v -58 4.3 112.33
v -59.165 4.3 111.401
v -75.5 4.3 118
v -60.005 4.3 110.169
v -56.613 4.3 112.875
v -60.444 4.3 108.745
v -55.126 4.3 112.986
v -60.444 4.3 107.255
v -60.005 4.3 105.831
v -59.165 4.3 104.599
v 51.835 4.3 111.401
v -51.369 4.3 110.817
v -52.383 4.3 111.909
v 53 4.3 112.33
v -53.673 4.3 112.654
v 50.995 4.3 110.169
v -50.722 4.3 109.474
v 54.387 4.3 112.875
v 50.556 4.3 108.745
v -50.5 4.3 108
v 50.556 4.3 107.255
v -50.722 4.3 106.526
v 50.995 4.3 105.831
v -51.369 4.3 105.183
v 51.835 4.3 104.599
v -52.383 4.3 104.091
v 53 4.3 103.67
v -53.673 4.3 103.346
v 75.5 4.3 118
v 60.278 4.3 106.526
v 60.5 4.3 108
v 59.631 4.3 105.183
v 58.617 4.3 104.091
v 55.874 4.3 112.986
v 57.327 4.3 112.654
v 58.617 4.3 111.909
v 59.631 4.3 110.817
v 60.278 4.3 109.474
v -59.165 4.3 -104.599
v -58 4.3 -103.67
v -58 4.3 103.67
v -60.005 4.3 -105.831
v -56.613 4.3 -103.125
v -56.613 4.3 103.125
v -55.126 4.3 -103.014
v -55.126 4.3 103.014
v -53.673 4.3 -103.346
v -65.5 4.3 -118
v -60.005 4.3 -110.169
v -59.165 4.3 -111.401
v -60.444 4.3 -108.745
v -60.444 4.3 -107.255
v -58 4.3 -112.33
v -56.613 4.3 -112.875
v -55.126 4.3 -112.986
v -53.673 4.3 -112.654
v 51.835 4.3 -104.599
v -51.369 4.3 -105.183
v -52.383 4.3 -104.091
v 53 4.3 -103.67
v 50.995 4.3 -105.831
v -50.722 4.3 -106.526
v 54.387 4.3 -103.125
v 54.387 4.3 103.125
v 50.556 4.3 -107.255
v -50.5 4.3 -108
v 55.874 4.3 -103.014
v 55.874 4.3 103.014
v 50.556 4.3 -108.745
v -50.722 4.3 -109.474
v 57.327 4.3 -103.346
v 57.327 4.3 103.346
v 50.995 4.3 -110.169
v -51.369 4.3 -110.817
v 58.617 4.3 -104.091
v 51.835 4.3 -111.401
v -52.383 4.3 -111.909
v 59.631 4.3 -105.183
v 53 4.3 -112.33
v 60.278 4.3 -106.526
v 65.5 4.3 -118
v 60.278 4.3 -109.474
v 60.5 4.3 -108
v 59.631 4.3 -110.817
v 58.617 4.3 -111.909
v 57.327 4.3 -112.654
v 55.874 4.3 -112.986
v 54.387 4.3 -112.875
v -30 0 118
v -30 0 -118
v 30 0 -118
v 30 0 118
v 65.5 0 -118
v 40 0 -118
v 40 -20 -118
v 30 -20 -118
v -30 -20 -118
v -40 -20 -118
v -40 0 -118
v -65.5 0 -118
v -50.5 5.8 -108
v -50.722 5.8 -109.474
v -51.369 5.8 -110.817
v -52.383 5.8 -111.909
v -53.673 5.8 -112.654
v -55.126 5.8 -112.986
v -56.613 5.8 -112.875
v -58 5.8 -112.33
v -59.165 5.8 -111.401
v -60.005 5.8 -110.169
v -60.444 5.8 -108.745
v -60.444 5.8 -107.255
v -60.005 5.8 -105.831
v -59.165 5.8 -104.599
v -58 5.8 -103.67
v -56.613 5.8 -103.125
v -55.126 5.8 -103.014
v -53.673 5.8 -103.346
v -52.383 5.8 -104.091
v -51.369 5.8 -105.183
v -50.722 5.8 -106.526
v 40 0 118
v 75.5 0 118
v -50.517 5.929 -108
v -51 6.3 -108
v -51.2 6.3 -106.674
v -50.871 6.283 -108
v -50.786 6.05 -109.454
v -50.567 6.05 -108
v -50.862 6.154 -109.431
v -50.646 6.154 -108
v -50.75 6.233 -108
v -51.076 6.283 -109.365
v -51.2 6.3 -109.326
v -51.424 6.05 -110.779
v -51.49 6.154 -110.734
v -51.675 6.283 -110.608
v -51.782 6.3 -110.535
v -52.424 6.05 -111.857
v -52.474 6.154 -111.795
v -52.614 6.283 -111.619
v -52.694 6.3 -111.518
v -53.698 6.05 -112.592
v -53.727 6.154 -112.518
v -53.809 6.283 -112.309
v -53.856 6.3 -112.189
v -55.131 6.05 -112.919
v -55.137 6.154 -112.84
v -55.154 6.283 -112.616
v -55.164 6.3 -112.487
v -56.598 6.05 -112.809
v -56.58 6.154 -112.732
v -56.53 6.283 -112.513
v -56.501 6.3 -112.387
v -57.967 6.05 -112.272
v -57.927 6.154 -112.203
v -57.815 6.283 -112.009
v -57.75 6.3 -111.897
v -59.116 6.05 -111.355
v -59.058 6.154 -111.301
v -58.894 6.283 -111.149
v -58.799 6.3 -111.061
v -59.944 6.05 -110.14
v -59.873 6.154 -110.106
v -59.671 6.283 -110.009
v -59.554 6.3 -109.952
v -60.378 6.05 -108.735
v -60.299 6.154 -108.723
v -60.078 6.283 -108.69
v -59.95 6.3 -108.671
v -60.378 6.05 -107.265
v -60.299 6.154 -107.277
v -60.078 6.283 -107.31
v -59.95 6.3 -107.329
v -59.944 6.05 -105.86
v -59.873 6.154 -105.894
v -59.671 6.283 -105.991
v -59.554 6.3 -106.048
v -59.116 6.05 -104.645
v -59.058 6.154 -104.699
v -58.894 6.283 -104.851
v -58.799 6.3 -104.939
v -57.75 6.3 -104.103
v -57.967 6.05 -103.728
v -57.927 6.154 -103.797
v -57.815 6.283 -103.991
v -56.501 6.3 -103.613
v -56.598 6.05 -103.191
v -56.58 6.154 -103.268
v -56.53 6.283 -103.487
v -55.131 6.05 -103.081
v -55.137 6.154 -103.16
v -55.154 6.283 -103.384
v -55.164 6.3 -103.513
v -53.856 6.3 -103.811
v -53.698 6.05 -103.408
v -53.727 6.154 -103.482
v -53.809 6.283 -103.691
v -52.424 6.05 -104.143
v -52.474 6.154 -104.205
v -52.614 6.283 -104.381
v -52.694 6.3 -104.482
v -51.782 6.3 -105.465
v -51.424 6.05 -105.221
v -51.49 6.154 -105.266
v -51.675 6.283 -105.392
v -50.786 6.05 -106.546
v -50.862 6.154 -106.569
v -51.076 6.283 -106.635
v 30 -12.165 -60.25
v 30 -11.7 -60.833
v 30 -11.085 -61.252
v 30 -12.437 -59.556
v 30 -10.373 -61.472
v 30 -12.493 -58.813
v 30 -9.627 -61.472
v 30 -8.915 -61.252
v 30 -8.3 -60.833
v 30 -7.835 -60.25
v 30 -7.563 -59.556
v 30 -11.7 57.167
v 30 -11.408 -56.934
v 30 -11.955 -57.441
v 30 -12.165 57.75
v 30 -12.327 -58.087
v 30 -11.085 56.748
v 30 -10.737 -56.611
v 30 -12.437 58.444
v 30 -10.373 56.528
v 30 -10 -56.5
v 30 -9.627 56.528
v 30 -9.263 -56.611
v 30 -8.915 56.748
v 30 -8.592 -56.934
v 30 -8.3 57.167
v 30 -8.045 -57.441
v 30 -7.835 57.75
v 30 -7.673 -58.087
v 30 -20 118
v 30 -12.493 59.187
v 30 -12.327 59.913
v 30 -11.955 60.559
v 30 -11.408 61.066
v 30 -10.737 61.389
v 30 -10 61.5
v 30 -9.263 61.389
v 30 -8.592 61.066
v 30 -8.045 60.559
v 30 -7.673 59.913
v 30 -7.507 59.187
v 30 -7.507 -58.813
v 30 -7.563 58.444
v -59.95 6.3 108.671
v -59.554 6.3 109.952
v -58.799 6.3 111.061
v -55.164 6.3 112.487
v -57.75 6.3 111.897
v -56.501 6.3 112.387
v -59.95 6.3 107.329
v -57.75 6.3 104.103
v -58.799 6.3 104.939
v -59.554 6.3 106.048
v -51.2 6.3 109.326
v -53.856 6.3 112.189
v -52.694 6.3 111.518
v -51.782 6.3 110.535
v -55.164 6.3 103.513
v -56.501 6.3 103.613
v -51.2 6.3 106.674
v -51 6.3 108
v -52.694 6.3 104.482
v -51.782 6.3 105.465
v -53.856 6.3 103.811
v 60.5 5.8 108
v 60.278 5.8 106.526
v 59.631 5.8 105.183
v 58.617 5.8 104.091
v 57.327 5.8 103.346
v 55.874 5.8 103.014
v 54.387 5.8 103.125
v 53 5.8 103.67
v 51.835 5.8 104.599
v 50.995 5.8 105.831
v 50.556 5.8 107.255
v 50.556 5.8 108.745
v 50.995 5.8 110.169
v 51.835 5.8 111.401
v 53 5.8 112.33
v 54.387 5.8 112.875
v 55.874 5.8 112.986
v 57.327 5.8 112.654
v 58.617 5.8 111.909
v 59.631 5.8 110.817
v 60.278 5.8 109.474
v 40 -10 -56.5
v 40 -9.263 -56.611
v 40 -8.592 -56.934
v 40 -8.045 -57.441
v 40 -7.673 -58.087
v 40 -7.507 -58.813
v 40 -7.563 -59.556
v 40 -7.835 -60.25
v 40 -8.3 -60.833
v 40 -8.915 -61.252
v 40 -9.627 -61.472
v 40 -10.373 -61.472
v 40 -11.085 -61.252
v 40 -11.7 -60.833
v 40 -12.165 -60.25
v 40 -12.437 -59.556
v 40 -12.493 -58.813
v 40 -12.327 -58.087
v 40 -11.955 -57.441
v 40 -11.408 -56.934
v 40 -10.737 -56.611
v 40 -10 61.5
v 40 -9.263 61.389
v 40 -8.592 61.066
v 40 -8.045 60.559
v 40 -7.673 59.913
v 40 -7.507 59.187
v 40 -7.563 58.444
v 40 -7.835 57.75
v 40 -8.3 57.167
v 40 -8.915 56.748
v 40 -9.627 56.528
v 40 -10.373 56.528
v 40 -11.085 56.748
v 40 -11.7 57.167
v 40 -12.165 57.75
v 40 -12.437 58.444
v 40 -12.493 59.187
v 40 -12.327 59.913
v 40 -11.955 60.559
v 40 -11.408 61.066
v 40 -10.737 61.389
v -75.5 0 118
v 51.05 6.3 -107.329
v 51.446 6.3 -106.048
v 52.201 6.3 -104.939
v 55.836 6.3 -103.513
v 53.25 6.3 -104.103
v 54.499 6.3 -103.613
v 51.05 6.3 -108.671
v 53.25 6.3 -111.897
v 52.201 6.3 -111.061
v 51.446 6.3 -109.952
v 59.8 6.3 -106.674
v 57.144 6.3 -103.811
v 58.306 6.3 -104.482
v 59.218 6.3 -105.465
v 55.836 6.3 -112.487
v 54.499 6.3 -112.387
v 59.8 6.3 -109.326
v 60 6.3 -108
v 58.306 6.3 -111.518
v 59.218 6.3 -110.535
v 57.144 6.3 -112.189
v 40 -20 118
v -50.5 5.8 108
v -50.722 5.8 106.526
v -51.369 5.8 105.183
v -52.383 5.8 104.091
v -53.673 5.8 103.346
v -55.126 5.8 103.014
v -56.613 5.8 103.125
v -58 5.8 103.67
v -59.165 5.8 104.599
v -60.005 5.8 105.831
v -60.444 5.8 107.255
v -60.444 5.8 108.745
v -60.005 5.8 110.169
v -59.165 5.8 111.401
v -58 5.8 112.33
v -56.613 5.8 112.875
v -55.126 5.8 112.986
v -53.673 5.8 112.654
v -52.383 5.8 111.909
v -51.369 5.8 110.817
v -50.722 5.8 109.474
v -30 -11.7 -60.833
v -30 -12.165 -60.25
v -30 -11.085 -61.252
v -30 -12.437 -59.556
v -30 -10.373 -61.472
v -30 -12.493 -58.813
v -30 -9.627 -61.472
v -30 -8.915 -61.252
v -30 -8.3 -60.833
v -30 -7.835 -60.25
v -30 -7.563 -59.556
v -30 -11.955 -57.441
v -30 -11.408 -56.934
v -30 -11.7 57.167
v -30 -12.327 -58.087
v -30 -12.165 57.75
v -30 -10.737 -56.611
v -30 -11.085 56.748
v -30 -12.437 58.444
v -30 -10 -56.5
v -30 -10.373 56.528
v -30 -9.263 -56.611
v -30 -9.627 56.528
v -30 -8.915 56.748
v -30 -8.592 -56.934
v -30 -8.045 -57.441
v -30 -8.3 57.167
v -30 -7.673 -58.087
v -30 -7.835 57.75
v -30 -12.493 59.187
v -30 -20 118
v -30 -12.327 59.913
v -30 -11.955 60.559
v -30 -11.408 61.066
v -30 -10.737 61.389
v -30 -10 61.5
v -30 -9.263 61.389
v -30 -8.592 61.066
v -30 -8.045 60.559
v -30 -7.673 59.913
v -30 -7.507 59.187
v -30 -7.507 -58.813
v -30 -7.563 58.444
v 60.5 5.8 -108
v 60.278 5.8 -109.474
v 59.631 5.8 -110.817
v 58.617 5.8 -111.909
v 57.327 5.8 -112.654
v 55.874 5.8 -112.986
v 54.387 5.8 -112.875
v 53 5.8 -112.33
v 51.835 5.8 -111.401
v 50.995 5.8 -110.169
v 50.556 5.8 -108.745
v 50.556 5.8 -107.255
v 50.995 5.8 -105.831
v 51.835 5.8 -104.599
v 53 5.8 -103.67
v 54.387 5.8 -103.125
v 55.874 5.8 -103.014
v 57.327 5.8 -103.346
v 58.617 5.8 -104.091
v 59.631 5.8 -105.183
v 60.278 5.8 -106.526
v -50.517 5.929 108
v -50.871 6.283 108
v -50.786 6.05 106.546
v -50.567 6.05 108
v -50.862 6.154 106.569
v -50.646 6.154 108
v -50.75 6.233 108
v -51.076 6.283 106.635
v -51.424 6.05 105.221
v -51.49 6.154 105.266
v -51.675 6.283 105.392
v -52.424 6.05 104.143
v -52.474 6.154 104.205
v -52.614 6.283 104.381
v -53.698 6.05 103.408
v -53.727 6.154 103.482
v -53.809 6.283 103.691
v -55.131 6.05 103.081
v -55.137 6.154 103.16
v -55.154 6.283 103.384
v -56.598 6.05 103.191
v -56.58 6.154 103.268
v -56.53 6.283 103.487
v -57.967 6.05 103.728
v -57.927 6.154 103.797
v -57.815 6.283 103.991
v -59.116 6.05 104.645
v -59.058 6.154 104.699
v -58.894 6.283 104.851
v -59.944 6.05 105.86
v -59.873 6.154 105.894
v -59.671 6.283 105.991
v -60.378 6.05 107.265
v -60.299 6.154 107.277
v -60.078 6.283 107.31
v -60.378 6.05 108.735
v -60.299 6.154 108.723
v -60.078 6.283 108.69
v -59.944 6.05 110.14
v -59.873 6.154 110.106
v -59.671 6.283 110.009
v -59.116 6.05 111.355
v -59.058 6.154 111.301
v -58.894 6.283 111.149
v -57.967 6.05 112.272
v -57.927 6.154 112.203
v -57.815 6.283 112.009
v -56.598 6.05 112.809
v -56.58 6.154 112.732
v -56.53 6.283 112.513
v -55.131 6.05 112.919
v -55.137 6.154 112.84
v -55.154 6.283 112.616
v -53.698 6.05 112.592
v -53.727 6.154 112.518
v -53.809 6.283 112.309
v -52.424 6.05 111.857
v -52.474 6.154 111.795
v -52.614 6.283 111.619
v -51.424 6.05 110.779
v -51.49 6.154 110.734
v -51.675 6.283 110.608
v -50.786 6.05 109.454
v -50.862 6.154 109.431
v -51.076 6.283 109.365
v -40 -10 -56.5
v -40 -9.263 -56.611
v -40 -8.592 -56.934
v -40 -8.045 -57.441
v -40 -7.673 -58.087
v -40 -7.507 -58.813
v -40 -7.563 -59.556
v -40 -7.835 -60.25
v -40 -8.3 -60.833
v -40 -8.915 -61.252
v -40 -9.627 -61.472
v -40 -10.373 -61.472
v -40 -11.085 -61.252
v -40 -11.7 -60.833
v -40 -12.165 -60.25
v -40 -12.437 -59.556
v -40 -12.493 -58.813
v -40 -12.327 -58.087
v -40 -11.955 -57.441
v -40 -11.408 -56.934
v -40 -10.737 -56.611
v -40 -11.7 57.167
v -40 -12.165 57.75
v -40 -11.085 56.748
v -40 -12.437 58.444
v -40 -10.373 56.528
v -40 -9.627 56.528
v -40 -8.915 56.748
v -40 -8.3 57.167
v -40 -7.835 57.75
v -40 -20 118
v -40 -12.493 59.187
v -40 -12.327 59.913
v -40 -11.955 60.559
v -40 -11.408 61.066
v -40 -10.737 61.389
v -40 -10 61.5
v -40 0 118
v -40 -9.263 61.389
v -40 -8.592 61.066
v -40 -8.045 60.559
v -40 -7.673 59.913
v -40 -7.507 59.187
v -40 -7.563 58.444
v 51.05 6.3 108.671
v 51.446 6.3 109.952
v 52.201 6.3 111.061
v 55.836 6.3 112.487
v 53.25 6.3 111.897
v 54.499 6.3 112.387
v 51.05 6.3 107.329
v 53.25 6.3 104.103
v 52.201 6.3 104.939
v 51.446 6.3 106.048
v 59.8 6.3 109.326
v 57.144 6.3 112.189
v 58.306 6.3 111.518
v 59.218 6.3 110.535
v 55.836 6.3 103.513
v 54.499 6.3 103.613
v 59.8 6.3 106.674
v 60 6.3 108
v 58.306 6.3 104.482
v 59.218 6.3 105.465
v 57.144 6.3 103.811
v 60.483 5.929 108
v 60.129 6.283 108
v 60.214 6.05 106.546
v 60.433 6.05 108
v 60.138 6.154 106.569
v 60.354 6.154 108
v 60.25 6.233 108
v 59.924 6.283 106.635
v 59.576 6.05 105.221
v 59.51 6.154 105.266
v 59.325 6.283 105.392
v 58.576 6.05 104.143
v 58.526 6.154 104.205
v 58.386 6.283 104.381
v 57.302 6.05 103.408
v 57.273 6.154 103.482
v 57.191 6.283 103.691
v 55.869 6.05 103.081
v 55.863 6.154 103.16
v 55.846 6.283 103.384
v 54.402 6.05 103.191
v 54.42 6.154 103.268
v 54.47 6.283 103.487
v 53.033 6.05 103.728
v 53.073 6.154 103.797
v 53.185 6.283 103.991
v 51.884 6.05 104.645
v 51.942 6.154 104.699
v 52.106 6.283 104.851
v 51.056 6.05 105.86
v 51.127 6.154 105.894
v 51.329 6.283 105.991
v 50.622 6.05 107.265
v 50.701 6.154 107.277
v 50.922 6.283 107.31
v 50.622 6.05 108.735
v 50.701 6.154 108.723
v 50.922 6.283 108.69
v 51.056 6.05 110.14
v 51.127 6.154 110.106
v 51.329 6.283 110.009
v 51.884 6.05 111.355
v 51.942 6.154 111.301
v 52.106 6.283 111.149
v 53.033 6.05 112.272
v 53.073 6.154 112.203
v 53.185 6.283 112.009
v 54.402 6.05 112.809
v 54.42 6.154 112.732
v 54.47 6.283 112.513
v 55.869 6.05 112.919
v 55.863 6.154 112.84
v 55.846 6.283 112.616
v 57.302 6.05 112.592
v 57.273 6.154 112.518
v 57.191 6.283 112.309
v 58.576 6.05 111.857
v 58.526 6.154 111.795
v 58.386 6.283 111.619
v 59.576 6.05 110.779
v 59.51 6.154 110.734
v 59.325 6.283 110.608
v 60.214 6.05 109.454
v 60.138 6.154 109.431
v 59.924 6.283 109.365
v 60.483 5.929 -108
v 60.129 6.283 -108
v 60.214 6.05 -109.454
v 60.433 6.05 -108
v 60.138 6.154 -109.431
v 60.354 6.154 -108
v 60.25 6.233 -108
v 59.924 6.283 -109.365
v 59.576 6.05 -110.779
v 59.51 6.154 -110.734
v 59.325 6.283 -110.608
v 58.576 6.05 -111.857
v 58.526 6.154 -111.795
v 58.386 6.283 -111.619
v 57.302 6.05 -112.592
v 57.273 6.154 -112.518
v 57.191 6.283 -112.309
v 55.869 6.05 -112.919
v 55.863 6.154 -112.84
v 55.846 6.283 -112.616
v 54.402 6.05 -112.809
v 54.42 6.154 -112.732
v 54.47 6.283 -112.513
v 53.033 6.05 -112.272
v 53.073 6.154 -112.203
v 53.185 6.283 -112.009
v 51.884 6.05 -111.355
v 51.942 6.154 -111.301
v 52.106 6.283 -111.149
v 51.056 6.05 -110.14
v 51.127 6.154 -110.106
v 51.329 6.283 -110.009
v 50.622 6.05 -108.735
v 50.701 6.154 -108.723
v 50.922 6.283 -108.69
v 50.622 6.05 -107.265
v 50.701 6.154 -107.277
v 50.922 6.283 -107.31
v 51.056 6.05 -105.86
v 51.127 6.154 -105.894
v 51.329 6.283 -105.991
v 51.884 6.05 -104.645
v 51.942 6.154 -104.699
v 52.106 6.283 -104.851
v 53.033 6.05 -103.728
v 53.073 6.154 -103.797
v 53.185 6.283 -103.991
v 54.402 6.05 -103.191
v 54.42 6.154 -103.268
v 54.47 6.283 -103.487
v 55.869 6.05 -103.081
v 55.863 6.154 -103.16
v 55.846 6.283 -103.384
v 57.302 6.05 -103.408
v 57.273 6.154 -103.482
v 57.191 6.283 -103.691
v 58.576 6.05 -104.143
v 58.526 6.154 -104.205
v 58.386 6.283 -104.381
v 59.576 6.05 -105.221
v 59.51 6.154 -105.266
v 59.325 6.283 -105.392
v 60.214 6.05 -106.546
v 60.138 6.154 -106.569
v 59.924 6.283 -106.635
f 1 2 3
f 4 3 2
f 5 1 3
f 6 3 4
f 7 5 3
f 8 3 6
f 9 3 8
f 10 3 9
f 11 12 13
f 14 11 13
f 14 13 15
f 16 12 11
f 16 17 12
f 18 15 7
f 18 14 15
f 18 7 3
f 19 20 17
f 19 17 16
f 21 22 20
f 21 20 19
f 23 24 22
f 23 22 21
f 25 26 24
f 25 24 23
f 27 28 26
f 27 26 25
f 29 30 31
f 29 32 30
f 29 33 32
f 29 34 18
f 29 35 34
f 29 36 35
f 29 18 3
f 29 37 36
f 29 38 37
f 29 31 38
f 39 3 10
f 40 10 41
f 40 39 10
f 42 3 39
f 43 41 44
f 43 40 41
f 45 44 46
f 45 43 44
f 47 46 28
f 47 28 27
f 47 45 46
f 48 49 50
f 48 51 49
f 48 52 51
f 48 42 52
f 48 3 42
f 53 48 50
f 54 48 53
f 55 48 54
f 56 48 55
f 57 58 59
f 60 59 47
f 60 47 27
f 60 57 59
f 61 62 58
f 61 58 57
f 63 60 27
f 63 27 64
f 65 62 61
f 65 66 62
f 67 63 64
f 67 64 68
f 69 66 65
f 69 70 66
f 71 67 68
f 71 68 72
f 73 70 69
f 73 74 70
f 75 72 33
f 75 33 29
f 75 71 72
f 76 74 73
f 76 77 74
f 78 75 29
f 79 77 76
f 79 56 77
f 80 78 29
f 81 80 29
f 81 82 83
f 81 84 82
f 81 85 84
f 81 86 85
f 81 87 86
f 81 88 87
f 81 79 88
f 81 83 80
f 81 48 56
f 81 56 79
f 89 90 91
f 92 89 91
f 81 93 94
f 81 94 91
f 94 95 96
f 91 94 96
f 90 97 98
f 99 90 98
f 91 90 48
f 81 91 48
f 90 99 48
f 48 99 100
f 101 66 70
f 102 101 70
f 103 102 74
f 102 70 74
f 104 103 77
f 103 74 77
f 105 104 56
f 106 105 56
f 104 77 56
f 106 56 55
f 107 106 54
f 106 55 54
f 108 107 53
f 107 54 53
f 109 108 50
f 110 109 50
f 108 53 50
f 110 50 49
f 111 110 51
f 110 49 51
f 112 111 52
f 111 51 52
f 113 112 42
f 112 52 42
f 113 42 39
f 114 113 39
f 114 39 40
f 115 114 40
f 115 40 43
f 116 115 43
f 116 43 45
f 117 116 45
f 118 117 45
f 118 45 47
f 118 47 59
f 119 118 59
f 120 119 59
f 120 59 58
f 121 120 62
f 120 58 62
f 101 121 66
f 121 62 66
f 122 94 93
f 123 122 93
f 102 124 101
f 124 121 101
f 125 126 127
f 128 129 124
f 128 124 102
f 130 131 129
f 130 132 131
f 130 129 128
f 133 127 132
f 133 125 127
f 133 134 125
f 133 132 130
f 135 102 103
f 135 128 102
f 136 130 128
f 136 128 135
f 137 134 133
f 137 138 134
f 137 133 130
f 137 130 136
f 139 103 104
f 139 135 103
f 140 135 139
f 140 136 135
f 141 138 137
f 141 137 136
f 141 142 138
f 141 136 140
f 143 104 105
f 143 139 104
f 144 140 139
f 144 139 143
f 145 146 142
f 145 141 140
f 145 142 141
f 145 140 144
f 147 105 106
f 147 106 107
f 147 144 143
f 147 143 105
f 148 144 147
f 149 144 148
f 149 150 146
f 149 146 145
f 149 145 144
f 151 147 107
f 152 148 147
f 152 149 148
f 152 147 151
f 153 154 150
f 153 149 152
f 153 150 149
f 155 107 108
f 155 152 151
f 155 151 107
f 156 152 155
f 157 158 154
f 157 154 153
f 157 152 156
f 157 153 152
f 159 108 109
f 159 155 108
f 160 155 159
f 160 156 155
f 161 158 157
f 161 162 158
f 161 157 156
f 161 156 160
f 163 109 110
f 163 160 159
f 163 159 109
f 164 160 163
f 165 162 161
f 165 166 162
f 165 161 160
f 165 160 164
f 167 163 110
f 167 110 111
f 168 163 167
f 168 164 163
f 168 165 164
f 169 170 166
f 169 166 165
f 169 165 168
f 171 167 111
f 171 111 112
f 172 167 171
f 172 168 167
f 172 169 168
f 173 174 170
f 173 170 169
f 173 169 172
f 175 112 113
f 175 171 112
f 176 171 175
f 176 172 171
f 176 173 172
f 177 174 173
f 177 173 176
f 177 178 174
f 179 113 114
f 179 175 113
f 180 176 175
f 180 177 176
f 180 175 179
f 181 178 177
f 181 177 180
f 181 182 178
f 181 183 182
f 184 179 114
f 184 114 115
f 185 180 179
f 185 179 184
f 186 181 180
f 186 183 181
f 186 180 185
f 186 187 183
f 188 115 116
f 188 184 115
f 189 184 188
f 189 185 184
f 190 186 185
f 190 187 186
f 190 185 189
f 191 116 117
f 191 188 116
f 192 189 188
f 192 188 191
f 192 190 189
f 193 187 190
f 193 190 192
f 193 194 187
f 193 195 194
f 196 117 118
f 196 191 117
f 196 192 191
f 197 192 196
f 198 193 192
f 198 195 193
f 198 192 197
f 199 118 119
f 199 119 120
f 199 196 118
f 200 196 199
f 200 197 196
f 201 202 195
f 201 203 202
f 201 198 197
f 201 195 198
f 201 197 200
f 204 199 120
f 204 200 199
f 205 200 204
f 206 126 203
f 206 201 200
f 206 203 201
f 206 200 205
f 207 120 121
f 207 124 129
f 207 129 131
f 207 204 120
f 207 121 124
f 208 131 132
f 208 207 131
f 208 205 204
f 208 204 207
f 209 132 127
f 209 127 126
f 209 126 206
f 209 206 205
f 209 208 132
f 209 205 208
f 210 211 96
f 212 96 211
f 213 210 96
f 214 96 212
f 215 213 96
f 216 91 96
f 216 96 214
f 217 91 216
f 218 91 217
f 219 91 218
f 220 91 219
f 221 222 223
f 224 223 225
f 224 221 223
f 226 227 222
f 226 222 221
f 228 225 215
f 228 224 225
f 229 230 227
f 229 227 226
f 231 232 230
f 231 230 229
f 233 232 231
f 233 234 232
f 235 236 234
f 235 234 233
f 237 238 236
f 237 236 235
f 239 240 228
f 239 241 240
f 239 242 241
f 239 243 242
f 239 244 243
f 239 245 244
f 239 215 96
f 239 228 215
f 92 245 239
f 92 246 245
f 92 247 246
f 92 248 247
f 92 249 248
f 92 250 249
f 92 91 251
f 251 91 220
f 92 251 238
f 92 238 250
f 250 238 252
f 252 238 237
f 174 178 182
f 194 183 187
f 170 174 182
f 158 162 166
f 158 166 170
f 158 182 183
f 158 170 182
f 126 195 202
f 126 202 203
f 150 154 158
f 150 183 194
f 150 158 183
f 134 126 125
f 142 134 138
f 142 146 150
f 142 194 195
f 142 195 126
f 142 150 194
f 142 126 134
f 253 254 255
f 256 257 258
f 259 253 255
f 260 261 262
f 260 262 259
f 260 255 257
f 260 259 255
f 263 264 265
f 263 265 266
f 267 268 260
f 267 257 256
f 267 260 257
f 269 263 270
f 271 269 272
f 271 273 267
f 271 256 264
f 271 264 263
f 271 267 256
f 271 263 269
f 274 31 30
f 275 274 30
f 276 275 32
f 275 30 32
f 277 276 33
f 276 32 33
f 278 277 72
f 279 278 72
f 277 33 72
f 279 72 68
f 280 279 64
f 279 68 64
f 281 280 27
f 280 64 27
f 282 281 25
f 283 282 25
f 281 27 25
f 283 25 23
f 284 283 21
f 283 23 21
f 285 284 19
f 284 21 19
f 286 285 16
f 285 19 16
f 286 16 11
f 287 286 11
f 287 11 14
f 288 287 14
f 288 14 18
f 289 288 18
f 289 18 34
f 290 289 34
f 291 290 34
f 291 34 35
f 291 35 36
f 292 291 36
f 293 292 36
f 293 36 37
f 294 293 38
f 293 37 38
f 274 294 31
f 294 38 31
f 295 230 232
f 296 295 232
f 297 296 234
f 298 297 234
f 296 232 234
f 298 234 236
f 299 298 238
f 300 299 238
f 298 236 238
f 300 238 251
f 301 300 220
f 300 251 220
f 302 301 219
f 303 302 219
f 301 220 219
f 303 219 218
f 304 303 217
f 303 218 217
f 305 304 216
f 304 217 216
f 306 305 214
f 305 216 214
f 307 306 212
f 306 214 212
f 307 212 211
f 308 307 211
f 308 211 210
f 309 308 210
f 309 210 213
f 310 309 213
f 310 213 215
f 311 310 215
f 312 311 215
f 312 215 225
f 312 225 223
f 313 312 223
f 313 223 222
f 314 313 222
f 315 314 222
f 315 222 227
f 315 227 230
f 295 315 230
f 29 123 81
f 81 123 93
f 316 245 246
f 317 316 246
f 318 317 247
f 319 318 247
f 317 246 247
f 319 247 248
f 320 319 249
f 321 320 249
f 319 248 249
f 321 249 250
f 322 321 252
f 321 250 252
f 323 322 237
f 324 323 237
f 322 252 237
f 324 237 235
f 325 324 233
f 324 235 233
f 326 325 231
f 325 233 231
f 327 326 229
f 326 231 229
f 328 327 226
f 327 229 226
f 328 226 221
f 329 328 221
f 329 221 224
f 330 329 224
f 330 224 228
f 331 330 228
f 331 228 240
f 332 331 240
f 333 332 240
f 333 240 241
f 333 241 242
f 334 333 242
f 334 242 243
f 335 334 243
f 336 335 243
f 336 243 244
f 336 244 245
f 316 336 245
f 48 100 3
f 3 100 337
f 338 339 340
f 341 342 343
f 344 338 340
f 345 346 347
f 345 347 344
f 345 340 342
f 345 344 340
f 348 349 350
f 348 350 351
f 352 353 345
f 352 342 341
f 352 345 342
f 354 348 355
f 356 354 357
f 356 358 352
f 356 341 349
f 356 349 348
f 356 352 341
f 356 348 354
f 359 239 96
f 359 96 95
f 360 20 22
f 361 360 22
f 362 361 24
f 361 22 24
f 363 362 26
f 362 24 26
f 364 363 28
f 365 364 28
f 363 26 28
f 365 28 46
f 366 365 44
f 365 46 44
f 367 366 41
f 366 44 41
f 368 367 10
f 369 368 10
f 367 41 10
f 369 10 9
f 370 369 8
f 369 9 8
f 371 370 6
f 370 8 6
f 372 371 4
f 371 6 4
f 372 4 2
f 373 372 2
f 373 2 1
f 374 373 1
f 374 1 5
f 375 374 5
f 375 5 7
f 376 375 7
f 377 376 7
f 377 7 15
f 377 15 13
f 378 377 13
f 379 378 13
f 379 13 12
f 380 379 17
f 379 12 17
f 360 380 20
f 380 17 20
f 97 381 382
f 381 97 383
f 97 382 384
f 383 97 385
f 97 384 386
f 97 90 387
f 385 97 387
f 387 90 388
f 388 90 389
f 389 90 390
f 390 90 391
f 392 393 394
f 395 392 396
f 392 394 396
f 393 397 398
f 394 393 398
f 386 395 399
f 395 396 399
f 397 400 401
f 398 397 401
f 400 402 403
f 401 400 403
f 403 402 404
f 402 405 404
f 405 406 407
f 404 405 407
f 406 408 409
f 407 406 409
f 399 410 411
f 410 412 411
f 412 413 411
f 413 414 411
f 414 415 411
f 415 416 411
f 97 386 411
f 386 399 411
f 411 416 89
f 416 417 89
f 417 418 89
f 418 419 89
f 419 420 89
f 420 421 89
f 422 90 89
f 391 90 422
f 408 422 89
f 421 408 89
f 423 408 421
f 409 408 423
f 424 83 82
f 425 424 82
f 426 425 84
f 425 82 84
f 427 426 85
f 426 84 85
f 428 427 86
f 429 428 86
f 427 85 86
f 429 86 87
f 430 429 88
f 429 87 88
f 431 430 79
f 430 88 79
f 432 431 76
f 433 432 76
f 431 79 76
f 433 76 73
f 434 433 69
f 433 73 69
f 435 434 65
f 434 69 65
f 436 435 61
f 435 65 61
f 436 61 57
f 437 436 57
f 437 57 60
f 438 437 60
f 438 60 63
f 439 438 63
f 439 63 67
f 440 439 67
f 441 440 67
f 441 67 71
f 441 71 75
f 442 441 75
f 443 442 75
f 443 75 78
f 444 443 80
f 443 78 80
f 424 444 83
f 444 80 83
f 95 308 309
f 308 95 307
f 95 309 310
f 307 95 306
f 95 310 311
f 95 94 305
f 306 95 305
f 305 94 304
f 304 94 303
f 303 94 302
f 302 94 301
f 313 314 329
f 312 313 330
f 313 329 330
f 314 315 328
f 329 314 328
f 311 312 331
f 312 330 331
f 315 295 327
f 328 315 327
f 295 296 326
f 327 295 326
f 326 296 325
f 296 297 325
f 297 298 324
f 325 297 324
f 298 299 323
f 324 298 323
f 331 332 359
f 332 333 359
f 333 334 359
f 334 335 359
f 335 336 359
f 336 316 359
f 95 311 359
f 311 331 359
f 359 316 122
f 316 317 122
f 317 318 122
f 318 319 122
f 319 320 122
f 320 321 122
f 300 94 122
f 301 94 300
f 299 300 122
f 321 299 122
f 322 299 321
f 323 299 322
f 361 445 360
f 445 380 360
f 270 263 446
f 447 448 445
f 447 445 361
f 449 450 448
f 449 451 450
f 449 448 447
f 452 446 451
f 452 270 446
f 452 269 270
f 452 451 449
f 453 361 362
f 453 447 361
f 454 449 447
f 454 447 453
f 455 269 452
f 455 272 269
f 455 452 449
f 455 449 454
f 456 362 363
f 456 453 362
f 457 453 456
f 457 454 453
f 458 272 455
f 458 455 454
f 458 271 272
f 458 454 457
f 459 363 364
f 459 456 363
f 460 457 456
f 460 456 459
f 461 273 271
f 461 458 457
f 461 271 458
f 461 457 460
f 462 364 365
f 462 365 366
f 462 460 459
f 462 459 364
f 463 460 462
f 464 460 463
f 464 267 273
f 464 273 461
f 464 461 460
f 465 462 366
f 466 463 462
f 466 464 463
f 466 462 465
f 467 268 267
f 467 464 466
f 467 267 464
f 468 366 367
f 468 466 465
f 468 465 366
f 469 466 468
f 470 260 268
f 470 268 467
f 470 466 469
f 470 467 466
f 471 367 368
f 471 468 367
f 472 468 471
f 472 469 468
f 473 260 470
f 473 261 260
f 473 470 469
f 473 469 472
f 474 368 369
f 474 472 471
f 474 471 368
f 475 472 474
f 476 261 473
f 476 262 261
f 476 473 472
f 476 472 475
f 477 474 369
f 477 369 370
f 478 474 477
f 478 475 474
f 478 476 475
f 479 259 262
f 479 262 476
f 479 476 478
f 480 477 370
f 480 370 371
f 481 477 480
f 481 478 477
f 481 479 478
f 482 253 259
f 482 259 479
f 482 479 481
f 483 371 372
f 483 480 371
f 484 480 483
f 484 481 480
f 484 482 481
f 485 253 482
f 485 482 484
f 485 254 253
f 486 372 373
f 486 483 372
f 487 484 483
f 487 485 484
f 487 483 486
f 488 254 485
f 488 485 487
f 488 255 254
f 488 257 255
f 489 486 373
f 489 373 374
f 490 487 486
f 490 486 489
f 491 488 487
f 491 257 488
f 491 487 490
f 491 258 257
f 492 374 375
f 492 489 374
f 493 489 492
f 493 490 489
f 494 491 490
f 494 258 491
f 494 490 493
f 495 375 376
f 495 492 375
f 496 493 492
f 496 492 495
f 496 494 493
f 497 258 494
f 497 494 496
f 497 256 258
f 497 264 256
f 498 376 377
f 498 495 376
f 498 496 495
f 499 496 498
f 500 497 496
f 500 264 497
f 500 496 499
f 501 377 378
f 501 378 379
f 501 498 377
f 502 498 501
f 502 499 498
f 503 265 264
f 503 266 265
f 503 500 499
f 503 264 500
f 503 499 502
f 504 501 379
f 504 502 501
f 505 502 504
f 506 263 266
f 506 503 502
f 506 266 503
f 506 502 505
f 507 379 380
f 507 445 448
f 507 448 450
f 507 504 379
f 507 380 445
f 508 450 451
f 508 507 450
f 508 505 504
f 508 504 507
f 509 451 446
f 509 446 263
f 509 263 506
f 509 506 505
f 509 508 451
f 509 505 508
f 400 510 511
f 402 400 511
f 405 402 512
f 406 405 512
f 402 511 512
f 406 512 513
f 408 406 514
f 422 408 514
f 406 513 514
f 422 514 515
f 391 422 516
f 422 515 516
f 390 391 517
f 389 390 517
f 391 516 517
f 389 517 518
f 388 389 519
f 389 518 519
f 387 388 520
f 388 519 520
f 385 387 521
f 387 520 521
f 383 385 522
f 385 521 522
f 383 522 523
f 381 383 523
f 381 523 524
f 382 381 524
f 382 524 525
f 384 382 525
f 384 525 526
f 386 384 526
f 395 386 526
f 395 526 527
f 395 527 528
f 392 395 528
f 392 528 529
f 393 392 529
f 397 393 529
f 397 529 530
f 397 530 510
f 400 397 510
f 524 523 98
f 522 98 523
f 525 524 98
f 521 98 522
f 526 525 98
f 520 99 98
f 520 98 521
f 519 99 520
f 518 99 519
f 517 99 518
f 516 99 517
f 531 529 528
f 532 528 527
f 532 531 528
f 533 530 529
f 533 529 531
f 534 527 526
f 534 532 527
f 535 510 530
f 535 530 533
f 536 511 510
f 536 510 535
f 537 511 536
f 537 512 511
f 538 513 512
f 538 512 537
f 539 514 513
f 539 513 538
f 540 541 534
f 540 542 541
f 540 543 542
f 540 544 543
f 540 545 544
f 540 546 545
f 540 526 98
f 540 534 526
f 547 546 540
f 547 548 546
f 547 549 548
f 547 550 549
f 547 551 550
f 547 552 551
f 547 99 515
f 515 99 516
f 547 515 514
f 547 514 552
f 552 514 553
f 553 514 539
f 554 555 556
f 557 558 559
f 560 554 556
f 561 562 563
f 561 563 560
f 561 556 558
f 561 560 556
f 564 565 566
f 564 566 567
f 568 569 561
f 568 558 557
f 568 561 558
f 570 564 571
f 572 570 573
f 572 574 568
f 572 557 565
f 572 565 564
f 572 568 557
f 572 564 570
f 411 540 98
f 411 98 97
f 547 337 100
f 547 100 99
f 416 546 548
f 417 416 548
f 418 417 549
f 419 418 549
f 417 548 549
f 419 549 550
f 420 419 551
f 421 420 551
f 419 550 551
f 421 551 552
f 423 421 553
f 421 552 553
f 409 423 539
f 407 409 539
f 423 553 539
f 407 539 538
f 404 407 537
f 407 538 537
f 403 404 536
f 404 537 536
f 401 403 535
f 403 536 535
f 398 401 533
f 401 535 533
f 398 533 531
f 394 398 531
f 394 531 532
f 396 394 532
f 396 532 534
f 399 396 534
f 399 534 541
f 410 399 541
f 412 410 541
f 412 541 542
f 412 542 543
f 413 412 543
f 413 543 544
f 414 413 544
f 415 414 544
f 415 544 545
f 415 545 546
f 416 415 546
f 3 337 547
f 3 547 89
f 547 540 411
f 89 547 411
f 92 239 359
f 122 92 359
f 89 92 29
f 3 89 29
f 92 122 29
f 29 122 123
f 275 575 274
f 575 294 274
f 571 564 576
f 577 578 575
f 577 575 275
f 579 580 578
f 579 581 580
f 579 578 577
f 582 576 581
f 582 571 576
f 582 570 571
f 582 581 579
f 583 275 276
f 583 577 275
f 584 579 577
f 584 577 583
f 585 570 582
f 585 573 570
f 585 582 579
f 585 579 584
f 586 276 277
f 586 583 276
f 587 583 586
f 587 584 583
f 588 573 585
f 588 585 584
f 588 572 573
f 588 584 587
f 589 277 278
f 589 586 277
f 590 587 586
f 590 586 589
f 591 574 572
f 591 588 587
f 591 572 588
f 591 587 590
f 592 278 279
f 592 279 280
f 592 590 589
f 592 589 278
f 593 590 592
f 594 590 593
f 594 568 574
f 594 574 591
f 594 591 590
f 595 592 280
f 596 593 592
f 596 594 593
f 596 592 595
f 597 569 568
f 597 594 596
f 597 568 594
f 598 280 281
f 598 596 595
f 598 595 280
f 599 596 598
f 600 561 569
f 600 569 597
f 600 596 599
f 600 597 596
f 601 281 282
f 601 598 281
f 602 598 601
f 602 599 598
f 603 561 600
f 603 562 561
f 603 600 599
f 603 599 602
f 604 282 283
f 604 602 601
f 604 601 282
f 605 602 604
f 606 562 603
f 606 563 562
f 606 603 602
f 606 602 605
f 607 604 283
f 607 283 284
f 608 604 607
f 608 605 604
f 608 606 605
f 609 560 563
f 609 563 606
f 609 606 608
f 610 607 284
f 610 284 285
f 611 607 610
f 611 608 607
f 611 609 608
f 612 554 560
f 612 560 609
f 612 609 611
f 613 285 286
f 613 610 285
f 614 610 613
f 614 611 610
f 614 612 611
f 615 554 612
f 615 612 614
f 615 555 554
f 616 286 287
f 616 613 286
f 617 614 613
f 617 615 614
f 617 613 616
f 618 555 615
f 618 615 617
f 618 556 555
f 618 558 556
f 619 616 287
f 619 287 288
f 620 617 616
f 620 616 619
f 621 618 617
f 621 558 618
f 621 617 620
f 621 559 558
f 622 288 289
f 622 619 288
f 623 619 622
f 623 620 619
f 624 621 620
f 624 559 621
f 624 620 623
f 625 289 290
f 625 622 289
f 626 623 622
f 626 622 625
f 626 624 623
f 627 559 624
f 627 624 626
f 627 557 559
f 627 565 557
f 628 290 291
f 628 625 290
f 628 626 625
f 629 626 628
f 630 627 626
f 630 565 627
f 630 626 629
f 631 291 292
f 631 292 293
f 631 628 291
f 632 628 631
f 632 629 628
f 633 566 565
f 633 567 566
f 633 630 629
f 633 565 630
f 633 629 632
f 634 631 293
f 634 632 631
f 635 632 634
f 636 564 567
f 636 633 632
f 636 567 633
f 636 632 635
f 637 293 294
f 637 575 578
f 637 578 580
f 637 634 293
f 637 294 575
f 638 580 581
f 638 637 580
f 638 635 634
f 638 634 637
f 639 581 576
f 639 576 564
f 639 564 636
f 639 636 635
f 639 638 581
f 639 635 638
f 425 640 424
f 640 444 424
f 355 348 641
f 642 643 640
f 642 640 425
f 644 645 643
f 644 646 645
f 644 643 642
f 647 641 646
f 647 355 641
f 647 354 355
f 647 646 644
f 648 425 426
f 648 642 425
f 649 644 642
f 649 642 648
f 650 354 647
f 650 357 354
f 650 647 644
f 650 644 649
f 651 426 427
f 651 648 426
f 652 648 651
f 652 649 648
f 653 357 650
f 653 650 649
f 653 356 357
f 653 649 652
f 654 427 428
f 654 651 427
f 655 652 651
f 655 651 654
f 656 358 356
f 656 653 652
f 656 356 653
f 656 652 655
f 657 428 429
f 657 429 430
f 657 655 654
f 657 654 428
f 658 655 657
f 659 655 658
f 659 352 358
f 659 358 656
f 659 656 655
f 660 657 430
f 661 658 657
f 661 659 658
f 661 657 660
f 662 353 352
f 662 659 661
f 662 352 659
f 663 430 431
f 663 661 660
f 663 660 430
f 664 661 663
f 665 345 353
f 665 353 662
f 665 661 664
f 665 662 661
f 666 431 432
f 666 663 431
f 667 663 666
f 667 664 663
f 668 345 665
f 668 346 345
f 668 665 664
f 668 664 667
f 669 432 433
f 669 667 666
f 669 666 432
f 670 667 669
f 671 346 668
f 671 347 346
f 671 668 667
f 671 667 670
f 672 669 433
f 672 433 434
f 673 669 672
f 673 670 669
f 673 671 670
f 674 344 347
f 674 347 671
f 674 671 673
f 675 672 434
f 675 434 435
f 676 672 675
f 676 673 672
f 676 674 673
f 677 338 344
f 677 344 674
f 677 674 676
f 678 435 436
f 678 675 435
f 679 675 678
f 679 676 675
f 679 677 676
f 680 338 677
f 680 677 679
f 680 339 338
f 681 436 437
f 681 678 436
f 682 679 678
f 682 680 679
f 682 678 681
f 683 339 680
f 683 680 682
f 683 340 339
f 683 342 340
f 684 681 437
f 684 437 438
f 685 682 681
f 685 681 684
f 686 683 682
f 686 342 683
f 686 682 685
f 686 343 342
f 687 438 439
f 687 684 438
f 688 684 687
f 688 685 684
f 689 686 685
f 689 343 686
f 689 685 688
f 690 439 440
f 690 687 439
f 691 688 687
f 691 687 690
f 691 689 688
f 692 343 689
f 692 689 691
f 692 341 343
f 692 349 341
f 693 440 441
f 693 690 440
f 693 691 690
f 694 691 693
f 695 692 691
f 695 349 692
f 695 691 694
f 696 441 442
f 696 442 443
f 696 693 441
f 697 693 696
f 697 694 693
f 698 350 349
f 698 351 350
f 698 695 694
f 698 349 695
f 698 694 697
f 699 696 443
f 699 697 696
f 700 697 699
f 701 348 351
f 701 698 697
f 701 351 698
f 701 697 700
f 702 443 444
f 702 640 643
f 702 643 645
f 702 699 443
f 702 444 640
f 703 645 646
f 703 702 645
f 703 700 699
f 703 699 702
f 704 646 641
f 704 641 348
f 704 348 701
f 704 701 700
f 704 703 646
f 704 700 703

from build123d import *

# Parameters (mm, degrees)
BOSS_EXTRUDE1_DEPTH     = 4.3
SKETCH3_W               = 10
SKETCH3_H               = 236
BOSS_EXTRUDE2_DEPTH     = 20
SKETCH4_R               = 5
BOSS_EXTRUDE3_DEPTH     = 2
FILLET1_R               = 0.5
SKETCH5_R               = 2.5
CUT_EXTRUDE1_DEPTH      = 36.5
CUT_EXTRUDE1_DEPTH_BACK = 116.5


with BuildPart() as part:
    # Sketch2 → Boss-Extrude1 (new body)
    with BuildSketch(Plane(origin=(0, 0, 0), x_dir=(1, 0, 0), z_dir=(0, 1, 0))):
        Polygon((-75.5, -118), (0, -118), (0, 118), (-65.5, 118), align=None)
        Polygon((0, 118), (0, -118), (75.5, -118), (65.5, 118), align=None)
    extrude(amount=BOSS_EXTRUDE1_DEPTH)

    # Sketch3 → Boss-Extrude2 (add)
    with BuildSketch(Plane.XZ):
        with Locations((-35, 0)):
            Rectangle(SKETCH3_W, SKETCH3_H)
        with Locations((35, 0)):
            Rectangle(SKETCH3_W, SKETCH3_H)
    extrude(amount=BOSS_EXTRUDE2_DEPTH)

    # Sketch4 → Boss-Extrude3 (add)
    with BuildSketch(Plane(origin=(0, 4.3, 0), x_dir=(1, 0, 0), z_dir=(0, 1, 0))):
        with Locations((-55.5, 108)):
            Circle(SKETCH4_R)
        with Locations((55.5, 108)):
            Circle(SKETCH4_R)
        with Locations((-55.5, -108)):
            Circle(SKETCH4_R)
        with Locations((55.5, -108)):
            Circle(SKETCH4_R)
    extrude(amount=BOSS_EXTRUDE3_DEPTH)

    # Fillet1
    fillet1_edges = [part.edges().sort_by_distance(p)[0] for p in [
        (-60.5, 6.3, -108),
        (50.5, 6.3, -108),
        (-60.5, 6.3, 108),
        (50.5, 6.3, 108),
    ]]
    fillet(fillet1_edges, radius=FILLET1_R)

    # Sketch5 → Cut-Extrude1 (cut, two sides)
    with BuildSketch(Plane.ZY.offset(40)) as cut_extrude1_sk:
        with Locations((-59, -10)):
            Circle(SKETCH5_R)
        with Locations((59, -10)):
            Circle(SKETCH5_R)
    extrude(amount=CUT_EXTRUDE1_DEPTH, mode=Mode.SUBTRACT)
    extrude(cut_extrude1_sk.sketch, amount=-CUT_EXTRUDE1_DEPTH_BACK, mode=Mode.SUBTRACT)


solid = part.part
